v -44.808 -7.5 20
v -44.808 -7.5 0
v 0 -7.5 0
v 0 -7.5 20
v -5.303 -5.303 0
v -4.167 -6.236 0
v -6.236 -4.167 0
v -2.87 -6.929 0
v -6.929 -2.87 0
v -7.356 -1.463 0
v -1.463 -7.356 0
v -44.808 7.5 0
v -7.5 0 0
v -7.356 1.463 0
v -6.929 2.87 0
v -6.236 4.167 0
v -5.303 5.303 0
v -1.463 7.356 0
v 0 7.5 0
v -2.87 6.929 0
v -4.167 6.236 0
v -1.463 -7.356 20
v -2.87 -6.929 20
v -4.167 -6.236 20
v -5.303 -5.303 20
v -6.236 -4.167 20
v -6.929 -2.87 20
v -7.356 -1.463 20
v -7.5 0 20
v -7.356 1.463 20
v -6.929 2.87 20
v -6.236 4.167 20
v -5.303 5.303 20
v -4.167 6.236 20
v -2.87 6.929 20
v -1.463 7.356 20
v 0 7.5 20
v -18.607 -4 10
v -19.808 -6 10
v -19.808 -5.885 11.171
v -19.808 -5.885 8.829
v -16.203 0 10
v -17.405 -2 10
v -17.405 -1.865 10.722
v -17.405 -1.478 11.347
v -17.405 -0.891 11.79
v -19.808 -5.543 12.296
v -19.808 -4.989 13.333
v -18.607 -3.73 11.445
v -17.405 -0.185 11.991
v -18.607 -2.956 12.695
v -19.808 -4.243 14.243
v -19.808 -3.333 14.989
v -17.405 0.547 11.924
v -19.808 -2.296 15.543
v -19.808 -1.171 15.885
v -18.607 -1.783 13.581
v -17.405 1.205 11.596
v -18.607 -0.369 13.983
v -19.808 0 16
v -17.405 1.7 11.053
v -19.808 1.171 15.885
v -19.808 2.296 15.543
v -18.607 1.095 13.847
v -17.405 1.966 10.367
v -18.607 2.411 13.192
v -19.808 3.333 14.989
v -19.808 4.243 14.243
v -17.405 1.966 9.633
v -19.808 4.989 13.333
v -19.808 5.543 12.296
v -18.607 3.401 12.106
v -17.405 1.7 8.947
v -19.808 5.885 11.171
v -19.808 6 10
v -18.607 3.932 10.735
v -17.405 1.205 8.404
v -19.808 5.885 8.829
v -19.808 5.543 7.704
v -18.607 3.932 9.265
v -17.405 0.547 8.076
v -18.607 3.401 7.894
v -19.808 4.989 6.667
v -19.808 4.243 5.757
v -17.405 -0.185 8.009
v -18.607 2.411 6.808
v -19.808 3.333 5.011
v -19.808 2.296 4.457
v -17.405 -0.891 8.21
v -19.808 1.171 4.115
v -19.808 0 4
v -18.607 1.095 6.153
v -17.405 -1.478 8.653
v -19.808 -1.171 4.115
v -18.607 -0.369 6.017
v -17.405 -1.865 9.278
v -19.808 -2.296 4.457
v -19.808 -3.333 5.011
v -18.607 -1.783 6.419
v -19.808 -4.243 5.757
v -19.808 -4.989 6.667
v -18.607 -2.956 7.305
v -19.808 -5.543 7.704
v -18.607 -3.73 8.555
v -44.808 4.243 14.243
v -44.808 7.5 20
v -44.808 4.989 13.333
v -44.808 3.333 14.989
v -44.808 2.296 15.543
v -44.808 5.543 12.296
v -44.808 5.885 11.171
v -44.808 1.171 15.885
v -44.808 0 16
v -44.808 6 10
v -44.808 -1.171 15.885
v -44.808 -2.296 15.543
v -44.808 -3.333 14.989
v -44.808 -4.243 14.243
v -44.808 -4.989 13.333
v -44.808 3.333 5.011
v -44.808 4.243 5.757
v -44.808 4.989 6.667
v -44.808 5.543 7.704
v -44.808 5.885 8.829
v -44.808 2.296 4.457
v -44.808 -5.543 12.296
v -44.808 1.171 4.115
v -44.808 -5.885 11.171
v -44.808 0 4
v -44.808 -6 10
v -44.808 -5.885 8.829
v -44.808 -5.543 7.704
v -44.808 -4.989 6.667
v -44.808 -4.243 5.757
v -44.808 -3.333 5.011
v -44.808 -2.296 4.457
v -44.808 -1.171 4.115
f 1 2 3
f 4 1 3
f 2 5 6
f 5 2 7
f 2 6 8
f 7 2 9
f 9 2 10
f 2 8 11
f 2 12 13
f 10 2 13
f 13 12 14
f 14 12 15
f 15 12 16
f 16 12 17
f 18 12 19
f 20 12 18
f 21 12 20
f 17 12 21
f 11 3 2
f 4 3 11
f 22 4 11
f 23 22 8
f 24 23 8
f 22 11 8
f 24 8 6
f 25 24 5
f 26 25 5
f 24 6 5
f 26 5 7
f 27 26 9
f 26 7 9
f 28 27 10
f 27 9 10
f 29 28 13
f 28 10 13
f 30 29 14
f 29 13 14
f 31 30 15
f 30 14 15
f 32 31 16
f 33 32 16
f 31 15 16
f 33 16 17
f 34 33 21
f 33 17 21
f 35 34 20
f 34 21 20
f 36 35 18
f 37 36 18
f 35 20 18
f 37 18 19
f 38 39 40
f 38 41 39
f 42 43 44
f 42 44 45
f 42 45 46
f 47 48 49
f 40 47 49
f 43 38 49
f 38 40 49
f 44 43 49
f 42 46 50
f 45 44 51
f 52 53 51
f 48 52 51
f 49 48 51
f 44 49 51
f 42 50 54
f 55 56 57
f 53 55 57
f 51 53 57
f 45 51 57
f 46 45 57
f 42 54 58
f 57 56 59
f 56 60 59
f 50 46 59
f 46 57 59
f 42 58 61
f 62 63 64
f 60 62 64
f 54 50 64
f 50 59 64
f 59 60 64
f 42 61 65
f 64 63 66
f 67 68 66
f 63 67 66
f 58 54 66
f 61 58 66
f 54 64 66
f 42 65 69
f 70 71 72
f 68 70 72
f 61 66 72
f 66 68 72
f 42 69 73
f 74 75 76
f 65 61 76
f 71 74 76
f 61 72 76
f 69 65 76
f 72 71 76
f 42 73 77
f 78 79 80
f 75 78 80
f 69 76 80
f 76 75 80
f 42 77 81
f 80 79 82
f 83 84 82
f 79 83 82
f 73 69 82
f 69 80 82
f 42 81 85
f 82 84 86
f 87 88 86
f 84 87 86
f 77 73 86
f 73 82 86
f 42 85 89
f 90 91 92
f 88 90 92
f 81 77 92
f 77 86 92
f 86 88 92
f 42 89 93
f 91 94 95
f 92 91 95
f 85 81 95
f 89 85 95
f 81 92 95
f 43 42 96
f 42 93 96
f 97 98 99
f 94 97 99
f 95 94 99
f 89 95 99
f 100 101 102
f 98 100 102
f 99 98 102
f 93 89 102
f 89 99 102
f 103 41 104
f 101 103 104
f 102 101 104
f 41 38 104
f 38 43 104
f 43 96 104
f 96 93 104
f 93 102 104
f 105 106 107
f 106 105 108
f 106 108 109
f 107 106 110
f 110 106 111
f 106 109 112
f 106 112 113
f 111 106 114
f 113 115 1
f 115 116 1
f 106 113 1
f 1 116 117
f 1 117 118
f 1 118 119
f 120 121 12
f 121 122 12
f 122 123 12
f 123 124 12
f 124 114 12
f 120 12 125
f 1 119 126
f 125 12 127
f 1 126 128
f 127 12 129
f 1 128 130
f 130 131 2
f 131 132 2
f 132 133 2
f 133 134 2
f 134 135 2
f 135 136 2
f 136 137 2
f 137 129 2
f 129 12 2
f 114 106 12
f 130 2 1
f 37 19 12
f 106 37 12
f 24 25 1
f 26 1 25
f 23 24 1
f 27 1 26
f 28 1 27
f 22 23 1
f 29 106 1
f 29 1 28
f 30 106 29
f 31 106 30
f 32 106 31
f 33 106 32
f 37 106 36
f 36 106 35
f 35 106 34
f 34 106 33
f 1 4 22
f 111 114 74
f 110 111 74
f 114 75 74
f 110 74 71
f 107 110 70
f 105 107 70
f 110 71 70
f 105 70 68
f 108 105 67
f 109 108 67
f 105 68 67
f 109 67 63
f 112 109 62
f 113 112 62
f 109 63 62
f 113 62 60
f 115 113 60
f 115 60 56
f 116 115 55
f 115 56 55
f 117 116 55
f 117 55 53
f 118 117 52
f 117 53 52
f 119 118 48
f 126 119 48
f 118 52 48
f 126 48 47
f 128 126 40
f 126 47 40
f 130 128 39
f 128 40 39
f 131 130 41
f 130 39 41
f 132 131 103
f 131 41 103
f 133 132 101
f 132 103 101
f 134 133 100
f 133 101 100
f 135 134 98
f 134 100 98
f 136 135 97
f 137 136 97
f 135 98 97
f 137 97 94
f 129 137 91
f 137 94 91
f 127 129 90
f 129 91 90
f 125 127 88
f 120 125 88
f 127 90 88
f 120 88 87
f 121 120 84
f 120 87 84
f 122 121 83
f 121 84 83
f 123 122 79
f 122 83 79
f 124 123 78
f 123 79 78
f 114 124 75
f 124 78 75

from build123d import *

# Parameters (mm, degrees)
F1_DEPTH = 20
F3_D     = 12
F3_DEPTH = 25
F3_TIP   = 3.6051637142


with BuildPart() as f1:
    # F0 (on Top) → F1 (new body)
    with BuildSketch(Plane.XY):
        with BuildLine():
            ThreePointArc((0, -7.5), (-7.5, 0), (0, 7.5))
            Line((0, 7.5), (-44.8082763299, 7.5))
            Line((-44.8082763299, 7.5), (-44.8082763299, -7.5))
            Line((-44.8082763299, -7.5), (0, -7.5))
        make_face()
    extrude(amount=F1_DEPTH)

    # F3
    with Locations(Plane(origin=(-44.8082763299, 0, 0), x_dir=(0, -1, 0), z_dir=(-1, 0, 0))):
        with Locations((0, 10)):
            Hole(F3_D / 2, depth=F3_DEPTH)
            with Locations((0, 0, -(F3_DEPTH + F3_TIP / 2))):  # 118° drill point
                Cone(0, F3_D / 2, F3_TIP, mode=Mode.SUBTRACT)


solid = f1.part
